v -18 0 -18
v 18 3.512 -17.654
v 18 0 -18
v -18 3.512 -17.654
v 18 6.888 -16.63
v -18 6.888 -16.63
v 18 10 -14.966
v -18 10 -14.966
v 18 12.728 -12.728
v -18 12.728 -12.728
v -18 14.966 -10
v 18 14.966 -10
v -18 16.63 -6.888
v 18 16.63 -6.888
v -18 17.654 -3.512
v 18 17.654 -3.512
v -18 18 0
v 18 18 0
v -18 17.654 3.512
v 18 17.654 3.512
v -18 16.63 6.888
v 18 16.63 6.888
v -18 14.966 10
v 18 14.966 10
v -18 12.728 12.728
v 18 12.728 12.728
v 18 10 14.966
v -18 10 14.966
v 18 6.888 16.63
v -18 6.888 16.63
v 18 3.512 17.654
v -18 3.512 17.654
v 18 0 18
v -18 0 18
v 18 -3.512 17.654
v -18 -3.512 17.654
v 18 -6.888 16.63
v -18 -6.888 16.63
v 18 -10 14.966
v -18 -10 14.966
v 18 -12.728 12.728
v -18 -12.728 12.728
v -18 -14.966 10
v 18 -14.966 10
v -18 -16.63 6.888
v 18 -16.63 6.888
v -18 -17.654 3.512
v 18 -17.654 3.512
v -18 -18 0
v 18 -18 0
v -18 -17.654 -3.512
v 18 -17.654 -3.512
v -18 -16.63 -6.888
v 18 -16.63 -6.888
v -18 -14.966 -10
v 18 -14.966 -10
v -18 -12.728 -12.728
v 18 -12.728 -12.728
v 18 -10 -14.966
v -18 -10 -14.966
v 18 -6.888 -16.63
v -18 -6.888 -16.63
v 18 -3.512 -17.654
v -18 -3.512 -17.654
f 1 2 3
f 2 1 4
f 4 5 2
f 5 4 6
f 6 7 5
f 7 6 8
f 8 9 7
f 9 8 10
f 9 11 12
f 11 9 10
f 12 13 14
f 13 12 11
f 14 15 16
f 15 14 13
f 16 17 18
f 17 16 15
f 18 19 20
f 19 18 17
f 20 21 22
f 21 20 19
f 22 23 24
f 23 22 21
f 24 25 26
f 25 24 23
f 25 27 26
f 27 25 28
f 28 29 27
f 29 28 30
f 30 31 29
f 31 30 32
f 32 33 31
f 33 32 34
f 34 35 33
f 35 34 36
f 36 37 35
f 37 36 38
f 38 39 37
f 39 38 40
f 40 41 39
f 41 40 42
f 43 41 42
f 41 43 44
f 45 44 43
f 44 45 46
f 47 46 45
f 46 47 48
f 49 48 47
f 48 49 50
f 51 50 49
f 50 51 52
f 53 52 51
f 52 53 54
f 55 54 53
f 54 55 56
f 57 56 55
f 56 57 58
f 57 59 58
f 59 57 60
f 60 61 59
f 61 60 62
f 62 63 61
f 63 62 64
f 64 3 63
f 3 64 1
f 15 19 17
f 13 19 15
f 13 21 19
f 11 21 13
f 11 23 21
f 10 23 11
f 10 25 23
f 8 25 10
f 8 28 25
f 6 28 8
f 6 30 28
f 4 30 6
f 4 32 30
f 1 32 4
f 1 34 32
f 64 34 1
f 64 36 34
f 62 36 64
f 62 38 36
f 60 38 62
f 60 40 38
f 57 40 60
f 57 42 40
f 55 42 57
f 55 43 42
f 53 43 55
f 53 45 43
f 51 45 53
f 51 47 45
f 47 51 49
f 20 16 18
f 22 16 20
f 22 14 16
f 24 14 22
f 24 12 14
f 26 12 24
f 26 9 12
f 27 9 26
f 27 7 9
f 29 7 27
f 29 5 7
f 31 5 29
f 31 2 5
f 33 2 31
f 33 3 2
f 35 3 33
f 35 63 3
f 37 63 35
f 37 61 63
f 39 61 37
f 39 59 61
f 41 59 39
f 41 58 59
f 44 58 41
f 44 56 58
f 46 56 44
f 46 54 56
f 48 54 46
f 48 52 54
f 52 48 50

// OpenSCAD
color("steelblue", 0) rotate([0, 90, 0]) cylinder(h = 36, r = 18, center = true, $fn = 32);
